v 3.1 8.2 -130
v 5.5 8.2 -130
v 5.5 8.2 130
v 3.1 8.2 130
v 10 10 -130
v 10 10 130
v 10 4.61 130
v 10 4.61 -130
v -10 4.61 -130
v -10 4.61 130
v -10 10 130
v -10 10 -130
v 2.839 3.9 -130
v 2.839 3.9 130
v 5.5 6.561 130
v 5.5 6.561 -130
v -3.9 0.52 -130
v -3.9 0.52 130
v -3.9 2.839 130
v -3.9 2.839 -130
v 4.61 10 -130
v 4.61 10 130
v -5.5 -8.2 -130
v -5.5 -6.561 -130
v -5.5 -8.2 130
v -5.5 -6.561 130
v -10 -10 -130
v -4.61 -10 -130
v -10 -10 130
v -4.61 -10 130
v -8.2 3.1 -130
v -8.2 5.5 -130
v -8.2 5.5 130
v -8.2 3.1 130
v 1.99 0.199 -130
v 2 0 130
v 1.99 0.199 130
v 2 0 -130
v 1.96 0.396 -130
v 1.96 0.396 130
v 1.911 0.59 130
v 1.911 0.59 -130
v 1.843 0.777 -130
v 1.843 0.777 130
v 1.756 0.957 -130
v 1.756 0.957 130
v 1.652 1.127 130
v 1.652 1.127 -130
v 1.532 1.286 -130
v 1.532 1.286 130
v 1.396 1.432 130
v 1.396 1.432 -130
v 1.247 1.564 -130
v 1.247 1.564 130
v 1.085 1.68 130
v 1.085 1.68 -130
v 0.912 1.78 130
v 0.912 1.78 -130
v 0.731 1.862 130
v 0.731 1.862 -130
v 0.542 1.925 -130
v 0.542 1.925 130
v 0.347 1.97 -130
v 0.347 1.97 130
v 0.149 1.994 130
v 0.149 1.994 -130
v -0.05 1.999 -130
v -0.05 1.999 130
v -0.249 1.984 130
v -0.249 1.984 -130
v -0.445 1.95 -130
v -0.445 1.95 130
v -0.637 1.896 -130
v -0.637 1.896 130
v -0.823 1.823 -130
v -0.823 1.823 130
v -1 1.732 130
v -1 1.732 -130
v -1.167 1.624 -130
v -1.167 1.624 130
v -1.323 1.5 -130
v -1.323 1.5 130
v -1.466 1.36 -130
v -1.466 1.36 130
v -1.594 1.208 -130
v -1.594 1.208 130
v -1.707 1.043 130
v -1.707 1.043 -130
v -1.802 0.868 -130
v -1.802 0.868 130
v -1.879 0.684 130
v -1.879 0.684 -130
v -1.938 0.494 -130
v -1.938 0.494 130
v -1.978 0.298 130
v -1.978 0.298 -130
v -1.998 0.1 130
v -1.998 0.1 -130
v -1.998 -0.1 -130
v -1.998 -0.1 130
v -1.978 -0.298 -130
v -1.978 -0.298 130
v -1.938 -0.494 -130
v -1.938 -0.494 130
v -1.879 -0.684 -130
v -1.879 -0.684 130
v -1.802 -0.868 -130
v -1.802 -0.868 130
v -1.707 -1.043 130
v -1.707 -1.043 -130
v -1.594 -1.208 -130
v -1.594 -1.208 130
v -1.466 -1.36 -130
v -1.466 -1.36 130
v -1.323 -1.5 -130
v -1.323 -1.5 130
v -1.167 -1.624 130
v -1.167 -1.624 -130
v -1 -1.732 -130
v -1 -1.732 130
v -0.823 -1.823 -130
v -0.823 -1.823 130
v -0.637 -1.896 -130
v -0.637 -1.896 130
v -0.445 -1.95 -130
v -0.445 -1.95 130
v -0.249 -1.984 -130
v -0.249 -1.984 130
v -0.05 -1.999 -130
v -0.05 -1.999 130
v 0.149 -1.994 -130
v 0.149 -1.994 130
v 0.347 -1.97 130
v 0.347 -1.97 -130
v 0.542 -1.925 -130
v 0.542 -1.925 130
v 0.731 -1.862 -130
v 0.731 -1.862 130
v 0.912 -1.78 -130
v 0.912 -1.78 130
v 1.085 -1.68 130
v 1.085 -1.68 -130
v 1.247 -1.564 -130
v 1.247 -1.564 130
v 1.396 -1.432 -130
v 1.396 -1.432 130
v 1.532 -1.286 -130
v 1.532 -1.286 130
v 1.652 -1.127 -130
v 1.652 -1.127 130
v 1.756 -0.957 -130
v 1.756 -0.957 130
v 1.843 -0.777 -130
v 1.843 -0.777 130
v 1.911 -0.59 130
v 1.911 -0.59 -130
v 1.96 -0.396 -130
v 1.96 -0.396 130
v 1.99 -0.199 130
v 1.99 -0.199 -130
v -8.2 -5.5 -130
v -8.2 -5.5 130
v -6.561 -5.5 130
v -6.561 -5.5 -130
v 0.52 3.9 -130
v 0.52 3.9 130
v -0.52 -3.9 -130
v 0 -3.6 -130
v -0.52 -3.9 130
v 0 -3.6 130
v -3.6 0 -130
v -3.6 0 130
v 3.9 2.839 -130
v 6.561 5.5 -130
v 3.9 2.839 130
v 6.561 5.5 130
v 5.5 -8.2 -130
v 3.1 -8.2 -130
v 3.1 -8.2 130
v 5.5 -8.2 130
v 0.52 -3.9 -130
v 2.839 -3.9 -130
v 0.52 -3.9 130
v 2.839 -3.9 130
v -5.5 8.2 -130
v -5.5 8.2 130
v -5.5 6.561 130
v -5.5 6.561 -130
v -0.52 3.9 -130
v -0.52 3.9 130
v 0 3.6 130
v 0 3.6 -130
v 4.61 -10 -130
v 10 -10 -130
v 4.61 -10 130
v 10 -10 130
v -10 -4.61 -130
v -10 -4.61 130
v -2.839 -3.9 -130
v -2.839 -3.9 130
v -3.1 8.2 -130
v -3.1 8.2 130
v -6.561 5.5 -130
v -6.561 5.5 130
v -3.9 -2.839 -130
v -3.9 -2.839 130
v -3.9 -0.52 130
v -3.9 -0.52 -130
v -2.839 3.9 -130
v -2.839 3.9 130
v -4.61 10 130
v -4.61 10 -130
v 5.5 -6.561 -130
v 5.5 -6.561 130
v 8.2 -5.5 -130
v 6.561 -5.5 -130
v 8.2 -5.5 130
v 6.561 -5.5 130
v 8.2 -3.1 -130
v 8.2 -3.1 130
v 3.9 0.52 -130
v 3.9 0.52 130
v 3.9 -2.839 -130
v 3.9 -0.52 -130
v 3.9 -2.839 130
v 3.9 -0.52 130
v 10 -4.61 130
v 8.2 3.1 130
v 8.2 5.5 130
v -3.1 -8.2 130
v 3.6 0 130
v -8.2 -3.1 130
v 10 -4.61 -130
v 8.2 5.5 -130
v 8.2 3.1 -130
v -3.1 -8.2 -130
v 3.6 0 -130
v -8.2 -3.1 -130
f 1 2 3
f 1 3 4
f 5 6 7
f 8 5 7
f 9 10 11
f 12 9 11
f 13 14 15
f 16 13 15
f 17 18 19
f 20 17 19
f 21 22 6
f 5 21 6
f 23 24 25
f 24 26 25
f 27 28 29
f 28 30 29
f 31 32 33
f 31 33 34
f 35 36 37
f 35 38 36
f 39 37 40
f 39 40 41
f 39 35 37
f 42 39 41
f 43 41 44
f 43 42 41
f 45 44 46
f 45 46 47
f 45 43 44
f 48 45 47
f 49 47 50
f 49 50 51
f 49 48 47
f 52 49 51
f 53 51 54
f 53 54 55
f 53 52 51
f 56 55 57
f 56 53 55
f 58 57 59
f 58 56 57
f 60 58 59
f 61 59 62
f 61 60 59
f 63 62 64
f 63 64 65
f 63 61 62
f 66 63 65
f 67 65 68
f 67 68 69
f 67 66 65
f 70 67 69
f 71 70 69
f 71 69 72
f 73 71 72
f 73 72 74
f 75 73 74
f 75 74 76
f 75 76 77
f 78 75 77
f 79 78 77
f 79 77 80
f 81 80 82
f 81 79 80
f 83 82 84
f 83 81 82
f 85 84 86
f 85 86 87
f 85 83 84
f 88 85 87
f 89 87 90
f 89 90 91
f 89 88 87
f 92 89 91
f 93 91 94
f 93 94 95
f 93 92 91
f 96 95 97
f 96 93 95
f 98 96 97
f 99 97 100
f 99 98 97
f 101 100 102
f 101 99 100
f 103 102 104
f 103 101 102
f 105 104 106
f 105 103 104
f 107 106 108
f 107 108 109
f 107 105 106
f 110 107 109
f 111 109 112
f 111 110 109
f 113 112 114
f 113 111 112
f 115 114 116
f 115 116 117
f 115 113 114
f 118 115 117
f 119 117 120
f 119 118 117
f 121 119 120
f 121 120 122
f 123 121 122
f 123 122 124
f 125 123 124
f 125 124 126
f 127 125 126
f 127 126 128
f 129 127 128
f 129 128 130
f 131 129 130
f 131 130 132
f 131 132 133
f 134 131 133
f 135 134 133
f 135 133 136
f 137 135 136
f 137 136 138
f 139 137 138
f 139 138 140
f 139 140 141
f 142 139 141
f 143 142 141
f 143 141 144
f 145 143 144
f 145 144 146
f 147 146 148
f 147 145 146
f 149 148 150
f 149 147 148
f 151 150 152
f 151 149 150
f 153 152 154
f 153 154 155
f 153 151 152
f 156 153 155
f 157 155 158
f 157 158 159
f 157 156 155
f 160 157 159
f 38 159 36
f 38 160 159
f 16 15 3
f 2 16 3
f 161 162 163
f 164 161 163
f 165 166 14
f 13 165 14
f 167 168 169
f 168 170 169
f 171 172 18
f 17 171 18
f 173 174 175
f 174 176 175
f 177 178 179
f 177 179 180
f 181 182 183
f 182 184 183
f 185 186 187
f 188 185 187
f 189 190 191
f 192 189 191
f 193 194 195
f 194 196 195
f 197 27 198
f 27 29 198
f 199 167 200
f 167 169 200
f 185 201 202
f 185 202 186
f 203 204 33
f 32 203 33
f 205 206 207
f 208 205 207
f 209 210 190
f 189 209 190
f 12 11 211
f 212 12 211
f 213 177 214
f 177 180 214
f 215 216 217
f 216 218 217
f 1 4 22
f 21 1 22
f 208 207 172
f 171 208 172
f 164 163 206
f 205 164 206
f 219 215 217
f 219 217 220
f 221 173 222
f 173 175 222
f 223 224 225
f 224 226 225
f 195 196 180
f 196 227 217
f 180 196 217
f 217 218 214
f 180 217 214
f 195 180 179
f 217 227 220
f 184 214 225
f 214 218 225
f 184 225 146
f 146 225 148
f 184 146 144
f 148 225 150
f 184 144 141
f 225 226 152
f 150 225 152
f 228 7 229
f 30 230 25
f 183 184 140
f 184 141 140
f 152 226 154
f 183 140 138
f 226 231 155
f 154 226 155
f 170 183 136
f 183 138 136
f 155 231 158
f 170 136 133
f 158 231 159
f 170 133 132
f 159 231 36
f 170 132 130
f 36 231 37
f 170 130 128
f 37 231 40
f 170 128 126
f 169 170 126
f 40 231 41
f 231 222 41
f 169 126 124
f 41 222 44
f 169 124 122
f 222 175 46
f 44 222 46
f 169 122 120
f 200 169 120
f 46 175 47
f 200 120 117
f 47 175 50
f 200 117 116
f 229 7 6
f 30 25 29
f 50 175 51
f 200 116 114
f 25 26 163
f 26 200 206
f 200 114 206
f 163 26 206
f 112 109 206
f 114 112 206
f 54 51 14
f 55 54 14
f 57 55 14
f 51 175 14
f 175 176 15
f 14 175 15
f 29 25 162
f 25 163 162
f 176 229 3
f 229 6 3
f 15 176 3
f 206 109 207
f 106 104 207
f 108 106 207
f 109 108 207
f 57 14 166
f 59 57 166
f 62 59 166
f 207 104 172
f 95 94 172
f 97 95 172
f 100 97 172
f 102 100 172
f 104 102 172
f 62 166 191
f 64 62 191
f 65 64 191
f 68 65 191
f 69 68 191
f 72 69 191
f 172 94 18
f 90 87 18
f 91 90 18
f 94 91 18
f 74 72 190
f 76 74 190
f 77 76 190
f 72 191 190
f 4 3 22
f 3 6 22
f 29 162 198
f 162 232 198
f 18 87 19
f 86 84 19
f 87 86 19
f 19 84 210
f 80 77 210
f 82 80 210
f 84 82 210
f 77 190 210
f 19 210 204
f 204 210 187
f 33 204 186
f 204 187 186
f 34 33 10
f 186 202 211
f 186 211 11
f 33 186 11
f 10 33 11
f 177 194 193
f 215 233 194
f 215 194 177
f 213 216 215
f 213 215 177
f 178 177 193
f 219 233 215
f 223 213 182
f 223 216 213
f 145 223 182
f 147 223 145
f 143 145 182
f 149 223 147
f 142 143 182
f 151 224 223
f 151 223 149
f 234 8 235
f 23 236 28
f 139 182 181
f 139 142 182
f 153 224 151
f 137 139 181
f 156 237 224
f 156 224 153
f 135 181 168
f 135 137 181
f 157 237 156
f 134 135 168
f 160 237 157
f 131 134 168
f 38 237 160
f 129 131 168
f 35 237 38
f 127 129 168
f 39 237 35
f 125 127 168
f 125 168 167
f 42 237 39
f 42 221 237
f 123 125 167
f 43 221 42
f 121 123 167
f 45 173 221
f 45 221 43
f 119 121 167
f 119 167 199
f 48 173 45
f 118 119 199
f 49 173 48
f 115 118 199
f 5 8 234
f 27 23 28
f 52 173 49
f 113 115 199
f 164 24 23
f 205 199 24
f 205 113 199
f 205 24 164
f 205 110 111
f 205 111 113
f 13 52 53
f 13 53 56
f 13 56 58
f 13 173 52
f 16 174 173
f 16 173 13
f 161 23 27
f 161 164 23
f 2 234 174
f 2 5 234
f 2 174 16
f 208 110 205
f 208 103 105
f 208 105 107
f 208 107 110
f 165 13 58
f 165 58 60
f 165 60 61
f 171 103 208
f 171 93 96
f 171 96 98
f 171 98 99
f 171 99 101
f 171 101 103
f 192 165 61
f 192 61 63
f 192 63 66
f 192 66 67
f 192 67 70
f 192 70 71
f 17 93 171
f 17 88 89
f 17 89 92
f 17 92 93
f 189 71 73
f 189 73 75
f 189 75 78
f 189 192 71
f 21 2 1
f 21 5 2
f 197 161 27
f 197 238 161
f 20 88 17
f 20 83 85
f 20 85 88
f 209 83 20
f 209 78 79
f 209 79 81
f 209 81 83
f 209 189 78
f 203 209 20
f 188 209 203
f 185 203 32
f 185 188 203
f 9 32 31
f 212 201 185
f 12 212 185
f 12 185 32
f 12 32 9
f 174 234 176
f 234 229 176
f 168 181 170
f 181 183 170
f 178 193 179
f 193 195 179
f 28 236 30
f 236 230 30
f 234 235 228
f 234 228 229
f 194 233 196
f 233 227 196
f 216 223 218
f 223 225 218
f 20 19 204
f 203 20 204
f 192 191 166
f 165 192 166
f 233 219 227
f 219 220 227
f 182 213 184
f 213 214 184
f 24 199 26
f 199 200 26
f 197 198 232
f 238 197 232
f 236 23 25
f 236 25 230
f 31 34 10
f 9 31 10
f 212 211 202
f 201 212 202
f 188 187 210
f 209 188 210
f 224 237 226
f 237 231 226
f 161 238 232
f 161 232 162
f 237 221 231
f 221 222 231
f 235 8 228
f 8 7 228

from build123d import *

# Parameters (mm, degrees)
SKETCH1_R           = 2
BOSS_EXTRUDE1_DEPTH = 130


with BuildPart() as part:
    # Sketch1 → Boss-Extrude1 (new body, symmetric)
    with BuildSketch(Plane.XY):
        Polygon((10, 10), (10, 4.610379336), (8.2, 3.1), (8.2, 5.5), (6.560660172, 5.5), (3.9, 2.839339828), (3.9, 0.519615242), (3.6, 0), (3.9, -0.519615242), (3.9, -2.839339828), (6.560660172, -5.5), (8.2, -5.5), (8.2, -3.1), (10, -4.610379336), (10, -10), (4.610379336, -10), (3.1, -8.2), (5.5, -8.2), (5.5, -6.560660172), (2.839339828, -3.9), (0.519615242, -3.9), (0, -3.6), (-0.519615242, -3.9), (-2.839339828, -3.9), (-5.5, -6.560660172), (-5.5, -8.2), (-3.1, -8.2), (-4.610379336, -10), (-10, -10), (-10, -4.610379336), (-8.2, -3.1), (-8.2, -5.5), (-6.560660172, -5.5), (-3.9, -2.839339828), (-3.9, -0.519615242), (-3.6, 0), (-3.9, 0.519615242), (-3.9, 2.839339828), (-6.560660172, 5.5), (-8.2, 5.5), (-8.2, 3.1), (-10, 4.610379336), (-10, 10), (-4.610379336, 10), (-3.1, 8.2), (-5.5, 8.2), (-5.5, 6.560660172), (-2.839339828, 3.9), (-0.519615242, 3.9), (0, 3.6), (0.519615242, 3.9), (2.839339828, 3.9), (5.5, 6.560660172), (5.5, 8.2), (3.1, 8.2), (4.610379336, 10), align=None)
        Circle(SKETCH1_R, mode=Mode.SUBTRACT)
    extrude(amount=BOSS_EXTRUDE1_DEPTH, both=True)


solid = part.part
